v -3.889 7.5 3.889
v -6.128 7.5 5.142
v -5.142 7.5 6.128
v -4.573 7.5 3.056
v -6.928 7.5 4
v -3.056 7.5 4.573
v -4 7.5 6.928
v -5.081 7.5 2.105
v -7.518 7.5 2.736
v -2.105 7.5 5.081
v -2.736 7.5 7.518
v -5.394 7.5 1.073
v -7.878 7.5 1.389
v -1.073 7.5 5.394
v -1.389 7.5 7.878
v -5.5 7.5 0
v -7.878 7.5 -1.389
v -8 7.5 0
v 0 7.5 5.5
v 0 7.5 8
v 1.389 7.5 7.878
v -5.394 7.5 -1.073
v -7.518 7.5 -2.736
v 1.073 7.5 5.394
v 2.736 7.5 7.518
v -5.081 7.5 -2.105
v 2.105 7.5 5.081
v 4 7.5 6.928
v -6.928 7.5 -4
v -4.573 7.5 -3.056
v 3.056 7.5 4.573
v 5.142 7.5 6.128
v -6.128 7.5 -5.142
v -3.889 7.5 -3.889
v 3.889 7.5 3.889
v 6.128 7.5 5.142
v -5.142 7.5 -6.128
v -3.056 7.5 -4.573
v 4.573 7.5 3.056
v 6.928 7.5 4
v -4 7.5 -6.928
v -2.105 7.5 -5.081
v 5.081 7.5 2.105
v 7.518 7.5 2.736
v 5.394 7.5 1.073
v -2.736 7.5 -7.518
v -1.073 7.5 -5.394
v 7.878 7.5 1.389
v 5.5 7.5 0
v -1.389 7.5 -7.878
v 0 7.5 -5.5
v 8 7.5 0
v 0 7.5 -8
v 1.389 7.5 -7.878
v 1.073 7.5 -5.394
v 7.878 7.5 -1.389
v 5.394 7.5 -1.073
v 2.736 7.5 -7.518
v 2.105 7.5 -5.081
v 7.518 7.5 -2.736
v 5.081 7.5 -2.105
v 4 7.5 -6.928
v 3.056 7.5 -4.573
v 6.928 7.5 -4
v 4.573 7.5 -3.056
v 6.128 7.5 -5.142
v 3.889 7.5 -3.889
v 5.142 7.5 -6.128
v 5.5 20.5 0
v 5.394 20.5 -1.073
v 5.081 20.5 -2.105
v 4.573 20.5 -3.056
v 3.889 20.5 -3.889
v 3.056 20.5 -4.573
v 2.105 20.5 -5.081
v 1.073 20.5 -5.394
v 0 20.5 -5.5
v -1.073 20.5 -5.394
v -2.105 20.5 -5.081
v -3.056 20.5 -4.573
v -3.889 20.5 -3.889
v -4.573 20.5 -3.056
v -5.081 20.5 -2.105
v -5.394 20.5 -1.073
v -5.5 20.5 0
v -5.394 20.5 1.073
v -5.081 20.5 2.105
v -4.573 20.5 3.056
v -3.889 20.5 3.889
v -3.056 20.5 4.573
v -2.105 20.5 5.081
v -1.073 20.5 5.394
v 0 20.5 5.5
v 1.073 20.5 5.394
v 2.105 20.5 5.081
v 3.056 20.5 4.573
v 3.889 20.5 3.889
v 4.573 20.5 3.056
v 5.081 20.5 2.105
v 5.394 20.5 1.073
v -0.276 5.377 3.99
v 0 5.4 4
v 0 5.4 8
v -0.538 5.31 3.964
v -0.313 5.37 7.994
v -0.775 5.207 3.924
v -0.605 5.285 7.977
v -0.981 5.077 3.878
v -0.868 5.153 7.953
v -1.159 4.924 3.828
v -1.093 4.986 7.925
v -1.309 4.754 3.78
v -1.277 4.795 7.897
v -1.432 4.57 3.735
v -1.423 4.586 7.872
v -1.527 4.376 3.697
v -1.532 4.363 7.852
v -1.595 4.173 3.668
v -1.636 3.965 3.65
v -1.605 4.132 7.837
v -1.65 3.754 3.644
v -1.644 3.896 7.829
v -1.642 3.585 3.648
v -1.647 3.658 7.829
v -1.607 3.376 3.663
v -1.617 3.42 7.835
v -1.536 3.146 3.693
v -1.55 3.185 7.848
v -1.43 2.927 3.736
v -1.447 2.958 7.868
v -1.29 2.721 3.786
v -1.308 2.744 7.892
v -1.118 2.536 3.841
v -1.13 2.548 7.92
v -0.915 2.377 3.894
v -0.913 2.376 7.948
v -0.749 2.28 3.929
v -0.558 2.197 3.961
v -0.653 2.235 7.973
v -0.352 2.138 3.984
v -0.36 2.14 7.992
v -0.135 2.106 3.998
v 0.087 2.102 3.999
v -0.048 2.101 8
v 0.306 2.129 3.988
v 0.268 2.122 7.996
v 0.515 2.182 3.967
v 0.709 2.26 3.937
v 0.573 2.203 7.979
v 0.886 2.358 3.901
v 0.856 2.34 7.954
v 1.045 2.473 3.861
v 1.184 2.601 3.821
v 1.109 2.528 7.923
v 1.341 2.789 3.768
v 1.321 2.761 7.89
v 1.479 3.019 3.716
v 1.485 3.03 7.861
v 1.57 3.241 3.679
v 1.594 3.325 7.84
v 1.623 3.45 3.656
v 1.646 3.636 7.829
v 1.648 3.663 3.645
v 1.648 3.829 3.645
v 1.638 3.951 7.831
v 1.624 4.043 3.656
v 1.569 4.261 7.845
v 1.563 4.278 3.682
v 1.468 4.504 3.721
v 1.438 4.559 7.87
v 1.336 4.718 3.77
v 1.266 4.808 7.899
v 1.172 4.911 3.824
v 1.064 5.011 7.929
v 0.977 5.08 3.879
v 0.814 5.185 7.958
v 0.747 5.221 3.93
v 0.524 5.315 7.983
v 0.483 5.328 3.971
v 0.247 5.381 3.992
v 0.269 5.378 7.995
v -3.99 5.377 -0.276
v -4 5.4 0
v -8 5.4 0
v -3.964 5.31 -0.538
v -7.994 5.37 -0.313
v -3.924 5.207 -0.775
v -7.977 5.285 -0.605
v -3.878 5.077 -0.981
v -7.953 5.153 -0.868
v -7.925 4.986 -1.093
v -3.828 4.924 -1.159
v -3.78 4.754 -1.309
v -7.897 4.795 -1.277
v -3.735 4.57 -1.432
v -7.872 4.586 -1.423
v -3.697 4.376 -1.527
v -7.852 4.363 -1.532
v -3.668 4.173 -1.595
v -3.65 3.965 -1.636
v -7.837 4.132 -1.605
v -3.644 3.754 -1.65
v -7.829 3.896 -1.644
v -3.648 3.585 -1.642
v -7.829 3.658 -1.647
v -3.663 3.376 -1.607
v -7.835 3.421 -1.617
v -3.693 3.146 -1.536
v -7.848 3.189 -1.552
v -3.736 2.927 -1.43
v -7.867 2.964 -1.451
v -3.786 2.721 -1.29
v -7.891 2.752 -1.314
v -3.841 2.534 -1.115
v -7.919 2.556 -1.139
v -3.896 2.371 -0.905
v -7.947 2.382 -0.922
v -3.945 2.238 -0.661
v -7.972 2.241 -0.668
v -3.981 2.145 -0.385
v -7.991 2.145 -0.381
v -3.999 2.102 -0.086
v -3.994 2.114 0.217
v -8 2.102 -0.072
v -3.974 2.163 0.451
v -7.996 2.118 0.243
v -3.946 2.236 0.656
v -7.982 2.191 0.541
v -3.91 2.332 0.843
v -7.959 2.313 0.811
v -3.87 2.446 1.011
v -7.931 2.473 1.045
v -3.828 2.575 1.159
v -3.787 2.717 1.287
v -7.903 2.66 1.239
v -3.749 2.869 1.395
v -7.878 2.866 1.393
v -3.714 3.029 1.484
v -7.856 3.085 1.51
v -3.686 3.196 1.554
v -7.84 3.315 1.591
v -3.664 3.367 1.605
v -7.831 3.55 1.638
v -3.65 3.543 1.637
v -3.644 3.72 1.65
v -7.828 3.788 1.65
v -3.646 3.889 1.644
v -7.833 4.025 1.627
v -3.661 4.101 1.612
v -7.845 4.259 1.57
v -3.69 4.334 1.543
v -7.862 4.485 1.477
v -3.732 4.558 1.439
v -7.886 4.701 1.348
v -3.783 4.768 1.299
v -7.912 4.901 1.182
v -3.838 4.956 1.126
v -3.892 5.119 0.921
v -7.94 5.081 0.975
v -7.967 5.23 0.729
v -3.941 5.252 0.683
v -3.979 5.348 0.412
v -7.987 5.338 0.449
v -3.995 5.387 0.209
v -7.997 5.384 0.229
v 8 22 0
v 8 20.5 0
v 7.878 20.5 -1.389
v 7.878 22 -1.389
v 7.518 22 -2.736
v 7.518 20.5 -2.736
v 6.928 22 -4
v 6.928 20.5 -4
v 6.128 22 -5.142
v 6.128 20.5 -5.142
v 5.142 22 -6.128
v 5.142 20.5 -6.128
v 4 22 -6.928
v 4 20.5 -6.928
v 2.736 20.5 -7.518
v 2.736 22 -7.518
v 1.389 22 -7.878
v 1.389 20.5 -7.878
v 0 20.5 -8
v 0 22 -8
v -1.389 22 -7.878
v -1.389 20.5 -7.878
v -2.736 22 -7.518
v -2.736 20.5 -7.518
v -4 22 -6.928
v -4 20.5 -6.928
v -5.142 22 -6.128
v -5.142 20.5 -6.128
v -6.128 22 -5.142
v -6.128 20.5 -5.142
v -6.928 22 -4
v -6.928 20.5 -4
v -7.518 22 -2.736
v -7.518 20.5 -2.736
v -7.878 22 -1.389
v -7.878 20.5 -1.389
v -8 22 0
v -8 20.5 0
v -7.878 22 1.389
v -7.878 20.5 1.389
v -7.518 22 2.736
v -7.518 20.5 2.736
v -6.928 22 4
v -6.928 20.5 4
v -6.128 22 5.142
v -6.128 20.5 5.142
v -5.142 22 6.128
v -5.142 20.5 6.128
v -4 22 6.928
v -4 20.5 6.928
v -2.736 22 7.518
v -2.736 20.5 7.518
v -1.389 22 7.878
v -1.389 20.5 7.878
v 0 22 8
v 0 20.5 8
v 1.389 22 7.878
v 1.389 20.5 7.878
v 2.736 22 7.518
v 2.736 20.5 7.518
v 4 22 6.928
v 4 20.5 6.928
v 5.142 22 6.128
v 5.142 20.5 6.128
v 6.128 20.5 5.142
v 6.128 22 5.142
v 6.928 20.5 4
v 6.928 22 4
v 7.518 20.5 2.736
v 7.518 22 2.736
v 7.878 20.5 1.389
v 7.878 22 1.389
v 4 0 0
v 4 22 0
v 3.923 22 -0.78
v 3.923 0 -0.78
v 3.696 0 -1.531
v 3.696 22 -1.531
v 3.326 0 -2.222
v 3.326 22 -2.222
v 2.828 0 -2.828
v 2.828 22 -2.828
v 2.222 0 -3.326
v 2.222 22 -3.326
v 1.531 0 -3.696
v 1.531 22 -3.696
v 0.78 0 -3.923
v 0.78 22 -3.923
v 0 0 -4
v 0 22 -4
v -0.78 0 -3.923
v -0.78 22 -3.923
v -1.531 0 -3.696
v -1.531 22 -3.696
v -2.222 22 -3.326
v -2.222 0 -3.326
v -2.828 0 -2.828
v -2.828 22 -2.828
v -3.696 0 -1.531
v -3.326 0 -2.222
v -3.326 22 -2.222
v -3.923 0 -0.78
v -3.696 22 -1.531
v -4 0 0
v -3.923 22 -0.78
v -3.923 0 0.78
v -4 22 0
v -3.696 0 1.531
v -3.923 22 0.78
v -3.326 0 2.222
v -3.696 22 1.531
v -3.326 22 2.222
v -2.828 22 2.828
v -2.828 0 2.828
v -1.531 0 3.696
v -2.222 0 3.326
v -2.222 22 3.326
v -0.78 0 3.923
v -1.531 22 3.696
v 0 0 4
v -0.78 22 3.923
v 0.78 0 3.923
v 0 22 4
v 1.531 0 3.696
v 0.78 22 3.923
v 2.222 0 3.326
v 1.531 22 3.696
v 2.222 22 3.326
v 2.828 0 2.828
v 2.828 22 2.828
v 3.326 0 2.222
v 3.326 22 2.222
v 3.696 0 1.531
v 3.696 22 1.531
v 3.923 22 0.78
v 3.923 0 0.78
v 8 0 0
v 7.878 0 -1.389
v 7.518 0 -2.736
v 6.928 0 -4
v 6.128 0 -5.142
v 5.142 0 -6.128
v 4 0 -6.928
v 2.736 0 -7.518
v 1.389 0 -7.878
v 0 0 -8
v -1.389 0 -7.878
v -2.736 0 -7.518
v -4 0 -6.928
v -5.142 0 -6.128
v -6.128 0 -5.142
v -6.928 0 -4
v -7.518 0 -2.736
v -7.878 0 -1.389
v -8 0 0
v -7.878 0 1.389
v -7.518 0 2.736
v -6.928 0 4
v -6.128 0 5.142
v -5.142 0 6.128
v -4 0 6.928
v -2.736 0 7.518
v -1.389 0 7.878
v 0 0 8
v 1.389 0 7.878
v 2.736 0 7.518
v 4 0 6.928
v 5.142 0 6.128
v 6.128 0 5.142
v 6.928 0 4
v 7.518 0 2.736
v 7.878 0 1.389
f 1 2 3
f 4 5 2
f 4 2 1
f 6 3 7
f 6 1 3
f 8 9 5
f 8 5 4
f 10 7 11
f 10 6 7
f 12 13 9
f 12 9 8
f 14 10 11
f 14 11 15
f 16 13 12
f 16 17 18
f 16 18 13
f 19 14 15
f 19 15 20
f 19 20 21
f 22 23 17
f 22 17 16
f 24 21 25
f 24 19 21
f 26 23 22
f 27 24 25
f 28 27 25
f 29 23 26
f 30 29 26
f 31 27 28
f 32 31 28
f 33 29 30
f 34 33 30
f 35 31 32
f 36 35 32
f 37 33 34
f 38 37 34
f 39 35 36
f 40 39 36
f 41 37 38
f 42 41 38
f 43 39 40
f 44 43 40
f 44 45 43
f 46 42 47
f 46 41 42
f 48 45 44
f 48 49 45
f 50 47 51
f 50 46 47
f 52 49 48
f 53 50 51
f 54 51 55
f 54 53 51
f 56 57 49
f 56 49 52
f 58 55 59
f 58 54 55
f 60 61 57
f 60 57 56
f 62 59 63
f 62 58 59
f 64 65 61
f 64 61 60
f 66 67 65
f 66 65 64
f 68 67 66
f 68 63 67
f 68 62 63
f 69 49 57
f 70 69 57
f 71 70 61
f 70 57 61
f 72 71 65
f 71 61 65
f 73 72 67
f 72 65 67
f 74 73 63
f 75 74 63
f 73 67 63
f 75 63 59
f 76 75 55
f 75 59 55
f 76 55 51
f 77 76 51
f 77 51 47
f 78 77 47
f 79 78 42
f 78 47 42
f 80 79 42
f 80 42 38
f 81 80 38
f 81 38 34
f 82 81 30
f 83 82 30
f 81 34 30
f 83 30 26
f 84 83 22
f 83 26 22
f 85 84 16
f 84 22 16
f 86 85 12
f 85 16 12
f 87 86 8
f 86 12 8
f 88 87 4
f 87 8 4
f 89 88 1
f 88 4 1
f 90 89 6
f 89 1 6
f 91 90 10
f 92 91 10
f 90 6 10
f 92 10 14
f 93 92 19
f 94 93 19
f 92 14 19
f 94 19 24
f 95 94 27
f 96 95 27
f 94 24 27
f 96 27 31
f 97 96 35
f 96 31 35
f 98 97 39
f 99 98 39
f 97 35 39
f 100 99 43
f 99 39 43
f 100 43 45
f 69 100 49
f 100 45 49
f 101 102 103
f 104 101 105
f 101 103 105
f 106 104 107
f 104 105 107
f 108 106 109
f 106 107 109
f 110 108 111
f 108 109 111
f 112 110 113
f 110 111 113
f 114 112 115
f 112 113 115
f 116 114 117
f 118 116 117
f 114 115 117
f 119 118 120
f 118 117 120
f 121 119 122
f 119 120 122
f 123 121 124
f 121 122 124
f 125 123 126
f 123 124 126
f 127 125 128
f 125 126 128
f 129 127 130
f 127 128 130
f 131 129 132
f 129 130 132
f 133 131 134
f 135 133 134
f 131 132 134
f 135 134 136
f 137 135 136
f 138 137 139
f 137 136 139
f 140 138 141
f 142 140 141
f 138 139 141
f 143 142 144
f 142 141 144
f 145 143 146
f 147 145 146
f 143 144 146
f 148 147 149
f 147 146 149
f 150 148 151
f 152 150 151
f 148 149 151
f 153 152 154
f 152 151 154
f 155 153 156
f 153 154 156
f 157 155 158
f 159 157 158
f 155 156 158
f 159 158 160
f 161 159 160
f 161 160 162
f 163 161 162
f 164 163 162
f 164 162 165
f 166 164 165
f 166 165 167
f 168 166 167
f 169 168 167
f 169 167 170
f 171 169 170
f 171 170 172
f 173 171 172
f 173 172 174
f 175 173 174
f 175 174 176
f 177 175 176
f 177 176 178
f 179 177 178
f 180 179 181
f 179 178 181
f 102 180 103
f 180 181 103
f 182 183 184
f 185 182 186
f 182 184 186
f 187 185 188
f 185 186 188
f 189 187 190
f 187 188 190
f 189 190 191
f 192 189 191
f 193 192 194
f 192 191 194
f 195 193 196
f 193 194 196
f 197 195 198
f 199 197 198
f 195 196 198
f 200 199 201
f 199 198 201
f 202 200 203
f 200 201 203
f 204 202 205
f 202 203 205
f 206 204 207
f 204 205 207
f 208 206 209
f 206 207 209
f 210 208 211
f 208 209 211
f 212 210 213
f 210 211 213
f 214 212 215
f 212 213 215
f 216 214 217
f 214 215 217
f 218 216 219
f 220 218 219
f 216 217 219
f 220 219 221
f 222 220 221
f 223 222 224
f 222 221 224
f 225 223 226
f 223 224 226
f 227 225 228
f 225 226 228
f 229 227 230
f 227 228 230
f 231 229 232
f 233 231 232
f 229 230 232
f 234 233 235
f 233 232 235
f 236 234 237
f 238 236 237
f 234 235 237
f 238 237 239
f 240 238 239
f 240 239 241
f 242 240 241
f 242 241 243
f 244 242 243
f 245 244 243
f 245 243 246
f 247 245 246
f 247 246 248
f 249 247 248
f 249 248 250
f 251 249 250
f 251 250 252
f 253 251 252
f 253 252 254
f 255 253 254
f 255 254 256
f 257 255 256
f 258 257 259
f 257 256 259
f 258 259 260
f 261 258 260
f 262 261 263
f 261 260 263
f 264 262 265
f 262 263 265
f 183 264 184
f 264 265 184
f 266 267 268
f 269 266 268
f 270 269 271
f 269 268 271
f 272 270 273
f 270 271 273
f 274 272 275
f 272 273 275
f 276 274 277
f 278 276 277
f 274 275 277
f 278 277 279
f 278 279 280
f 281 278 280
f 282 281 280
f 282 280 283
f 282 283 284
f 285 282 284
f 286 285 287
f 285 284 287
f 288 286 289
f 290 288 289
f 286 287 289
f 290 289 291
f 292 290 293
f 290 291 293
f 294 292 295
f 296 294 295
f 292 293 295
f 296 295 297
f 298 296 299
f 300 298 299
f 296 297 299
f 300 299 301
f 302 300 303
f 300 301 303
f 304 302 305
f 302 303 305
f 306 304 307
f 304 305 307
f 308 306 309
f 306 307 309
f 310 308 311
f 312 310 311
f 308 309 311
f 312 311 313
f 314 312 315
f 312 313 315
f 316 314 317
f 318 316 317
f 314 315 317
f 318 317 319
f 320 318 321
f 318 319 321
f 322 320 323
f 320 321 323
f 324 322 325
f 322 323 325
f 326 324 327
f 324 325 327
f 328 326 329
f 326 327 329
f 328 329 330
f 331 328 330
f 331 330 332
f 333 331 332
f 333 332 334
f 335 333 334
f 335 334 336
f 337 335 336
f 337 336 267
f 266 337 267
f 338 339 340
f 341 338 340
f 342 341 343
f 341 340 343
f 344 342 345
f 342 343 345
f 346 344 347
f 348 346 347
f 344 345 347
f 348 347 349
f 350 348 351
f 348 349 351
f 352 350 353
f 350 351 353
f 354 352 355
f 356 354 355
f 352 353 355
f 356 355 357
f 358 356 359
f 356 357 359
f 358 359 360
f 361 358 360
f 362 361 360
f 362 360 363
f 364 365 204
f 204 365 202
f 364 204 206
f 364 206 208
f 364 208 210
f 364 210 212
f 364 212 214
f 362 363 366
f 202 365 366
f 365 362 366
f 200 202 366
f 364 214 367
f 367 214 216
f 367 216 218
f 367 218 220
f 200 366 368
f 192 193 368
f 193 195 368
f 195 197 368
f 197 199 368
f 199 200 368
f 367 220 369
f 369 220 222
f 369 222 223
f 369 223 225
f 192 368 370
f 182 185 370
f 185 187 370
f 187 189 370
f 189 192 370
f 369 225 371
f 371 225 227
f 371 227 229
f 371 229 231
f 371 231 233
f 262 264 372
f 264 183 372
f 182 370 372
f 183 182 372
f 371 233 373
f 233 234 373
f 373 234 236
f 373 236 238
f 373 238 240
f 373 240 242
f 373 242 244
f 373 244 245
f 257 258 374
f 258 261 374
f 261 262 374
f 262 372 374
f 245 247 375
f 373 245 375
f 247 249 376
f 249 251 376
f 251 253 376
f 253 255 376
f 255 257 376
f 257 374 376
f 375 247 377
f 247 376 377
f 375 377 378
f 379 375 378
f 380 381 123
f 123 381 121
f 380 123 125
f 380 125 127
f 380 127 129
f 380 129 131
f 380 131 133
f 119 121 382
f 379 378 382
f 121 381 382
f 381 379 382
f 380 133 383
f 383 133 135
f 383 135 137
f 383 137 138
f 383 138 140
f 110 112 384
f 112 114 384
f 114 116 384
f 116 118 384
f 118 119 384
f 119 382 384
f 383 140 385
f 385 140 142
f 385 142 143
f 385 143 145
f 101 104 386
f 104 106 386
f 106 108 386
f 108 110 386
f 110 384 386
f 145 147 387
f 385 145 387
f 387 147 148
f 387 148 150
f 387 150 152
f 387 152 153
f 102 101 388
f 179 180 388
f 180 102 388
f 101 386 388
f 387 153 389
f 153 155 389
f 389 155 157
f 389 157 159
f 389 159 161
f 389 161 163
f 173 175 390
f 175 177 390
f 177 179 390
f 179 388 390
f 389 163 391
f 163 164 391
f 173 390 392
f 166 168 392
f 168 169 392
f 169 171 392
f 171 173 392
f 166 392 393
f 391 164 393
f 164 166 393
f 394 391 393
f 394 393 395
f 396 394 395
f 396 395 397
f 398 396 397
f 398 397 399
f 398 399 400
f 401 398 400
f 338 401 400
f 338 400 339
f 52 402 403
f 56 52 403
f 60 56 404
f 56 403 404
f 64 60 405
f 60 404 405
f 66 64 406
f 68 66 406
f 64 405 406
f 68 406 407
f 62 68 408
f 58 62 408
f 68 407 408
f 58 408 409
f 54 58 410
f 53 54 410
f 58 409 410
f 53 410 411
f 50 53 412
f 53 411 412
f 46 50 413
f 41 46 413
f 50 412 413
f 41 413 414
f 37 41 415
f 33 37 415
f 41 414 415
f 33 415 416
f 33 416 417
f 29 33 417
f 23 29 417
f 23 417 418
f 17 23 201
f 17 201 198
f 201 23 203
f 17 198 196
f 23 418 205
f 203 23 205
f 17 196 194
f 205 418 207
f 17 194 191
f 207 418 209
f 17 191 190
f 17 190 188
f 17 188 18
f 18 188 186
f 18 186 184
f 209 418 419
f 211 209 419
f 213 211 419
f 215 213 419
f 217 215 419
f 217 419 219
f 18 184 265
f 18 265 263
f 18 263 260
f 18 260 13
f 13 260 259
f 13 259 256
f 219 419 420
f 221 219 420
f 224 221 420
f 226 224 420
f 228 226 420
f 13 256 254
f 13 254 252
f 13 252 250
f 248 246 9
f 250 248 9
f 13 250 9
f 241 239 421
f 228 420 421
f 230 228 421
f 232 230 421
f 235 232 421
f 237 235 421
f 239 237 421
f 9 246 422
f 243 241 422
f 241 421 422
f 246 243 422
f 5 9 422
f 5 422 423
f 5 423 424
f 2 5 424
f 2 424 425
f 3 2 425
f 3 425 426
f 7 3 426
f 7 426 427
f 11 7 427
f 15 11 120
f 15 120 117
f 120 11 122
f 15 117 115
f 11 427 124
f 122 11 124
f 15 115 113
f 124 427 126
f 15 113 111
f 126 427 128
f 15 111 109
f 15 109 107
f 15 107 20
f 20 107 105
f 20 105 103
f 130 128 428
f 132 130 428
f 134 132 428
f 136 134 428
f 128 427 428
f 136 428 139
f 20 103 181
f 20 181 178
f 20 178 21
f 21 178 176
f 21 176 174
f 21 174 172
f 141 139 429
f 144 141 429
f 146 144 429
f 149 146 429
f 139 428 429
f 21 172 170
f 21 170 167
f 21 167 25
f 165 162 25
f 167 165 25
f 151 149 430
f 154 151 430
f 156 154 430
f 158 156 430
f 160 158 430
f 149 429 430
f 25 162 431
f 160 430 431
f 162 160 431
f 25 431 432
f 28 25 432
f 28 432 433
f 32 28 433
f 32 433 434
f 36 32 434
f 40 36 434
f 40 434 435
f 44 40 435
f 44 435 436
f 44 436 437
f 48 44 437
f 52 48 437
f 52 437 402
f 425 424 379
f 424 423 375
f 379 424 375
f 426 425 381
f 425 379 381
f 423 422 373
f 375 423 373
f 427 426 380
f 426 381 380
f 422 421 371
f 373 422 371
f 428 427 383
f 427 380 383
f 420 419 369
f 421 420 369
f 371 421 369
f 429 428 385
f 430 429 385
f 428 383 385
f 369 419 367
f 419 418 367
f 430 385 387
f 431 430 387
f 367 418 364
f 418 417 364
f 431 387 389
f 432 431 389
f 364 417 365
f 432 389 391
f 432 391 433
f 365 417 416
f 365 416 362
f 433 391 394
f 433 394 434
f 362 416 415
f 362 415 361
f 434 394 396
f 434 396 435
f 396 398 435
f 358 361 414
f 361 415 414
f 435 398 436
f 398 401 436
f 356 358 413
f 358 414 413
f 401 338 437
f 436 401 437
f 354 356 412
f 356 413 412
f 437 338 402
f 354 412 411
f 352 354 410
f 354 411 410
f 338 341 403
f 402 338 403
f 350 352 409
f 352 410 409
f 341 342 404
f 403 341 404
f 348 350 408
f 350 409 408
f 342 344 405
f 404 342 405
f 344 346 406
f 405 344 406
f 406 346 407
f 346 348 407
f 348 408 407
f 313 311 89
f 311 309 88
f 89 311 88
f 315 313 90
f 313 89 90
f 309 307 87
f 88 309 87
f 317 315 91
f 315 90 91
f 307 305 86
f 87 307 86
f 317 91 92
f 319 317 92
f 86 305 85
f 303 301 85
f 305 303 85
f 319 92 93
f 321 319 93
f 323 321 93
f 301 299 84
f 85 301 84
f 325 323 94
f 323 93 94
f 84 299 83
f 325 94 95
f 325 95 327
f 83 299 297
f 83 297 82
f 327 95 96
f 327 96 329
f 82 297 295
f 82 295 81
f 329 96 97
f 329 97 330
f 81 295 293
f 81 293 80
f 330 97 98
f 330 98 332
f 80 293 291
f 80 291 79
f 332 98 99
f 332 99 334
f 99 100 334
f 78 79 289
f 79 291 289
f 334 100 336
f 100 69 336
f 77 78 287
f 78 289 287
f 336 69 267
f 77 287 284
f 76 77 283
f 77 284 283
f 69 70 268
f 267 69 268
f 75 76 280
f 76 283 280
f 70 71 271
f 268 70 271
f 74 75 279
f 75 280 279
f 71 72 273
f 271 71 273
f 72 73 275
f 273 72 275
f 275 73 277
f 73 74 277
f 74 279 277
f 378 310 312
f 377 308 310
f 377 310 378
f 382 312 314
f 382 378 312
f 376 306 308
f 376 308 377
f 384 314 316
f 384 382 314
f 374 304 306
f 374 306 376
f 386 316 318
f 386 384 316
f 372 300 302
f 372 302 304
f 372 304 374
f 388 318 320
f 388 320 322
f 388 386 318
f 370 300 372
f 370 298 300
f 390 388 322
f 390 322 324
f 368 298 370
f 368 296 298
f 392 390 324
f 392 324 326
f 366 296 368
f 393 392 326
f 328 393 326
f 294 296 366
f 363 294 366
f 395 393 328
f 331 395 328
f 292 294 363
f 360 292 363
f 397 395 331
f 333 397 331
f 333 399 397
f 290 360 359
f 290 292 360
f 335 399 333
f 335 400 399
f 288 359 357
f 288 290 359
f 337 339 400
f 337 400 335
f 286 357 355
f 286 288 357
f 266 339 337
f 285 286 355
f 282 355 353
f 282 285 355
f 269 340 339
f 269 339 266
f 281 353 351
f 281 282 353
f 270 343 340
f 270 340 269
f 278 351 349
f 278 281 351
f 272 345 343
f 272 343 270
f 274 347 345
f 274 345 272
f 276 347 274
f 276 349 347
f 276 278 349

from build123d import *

# Parameters (mm, degrees)
CROQUIS1_R              = 8
SALIENTE_EXTRUIR1_DEPTH = 7.5
CROQUIS2_R              = 5.5
SALIENTE_EXTRUIR2_DEPTH = 13
CROQUIS3_R              = 8
SALIENTE_EXTRUIR3_DEPTH = 1.5
CROQUIS4_R              = 4
CORTAR_EXTRUIR1_DEPTH   = 23
CROQUIS6_W              = 1.65
CROQUIS6_H              = 8.001
MATRIZC1_COUNT          = 2
MATRIZC1_ANGLE          = 90


with BuildPart() as part:
    # Croquis1 → Saliente-Extruir1 (new body)
    with BuildSketch(Plane(origin=(0, 0, 0), x_dir=(1, 0, 0), z_dir=(0, 1, 0))):
        Circle(CROQUIS1_R)
    extrude(amount=SALIENTE_EXTRUIR1_DEPTH)

    # Croquis2 → Saliente-Extruir2 (add)
    with BuildSketch(Plane(origin=(0, 7.5, 0), x_dir=(1, 0, 0), z_dir=(0, 1, 0))):
        Circle(CROQUIS2_R)
    extrude(amount=SALIENTE_EXTRUIR2_DEPTH)

    # Croquis3 → Saliente-Extruir3 (add)
    with BuildSketch(Plane(origin=(0, 20.5, 0), x_dir=(1, 0, 0), z_dir=(0, 1, 0))):
        Circle(CROQUIS3_R)
    extrude(amount=SALIENTE_EXTRUIR3_DEPTH)

    # Croquis4 → Cortar-Extruir1 (cut, through all)
    with BuildSketch(Plane(origin=(0, 22, 0), x_dir=(1, 0, 0), z_dir=(0, 1, 0))):
        Circle(CROQUIS4_R)
    extrude(amount=-CORTAR_EXTRUIR1_DEPTH, mode=Mode.SUBTRACT)

    # Croquis6 → Taladro roscado M41 (falta definir posicio) (revolve, cut)
    with BuildSketch(Plane(origin=(0, 3.75, 0), x_dir=(0, 1, 0), z_dir=(1, 0, 0))):
        with Locations((0.825, 4.0005)):
            Rectangle(CROQUIS6_W, CROQUIS6_H)
    taladro_roscado_m41_falta_definir_posic = revolve(axis=Axis((0, 3.75, -6.35), (0, 0, 1)), mode=Mode.SUBTRACT)

    # MatrizC1: Taladro roscado M41 (falta definir posicio) ×2 about axis
    matrizc1_axis = Axis((0, 7.5, 0), (0, -1, 0))
    for i in range(1, MATRIZC1_COUNT):
        add(taladro_roscado_m41_falta_definir_posic.rotate(matrizc1_axis, i * MATRIZC1_ANGLE / (MATRIZC1_COUNT - 1)), mode=Mode.SUBTRACT)


solid = part.part
